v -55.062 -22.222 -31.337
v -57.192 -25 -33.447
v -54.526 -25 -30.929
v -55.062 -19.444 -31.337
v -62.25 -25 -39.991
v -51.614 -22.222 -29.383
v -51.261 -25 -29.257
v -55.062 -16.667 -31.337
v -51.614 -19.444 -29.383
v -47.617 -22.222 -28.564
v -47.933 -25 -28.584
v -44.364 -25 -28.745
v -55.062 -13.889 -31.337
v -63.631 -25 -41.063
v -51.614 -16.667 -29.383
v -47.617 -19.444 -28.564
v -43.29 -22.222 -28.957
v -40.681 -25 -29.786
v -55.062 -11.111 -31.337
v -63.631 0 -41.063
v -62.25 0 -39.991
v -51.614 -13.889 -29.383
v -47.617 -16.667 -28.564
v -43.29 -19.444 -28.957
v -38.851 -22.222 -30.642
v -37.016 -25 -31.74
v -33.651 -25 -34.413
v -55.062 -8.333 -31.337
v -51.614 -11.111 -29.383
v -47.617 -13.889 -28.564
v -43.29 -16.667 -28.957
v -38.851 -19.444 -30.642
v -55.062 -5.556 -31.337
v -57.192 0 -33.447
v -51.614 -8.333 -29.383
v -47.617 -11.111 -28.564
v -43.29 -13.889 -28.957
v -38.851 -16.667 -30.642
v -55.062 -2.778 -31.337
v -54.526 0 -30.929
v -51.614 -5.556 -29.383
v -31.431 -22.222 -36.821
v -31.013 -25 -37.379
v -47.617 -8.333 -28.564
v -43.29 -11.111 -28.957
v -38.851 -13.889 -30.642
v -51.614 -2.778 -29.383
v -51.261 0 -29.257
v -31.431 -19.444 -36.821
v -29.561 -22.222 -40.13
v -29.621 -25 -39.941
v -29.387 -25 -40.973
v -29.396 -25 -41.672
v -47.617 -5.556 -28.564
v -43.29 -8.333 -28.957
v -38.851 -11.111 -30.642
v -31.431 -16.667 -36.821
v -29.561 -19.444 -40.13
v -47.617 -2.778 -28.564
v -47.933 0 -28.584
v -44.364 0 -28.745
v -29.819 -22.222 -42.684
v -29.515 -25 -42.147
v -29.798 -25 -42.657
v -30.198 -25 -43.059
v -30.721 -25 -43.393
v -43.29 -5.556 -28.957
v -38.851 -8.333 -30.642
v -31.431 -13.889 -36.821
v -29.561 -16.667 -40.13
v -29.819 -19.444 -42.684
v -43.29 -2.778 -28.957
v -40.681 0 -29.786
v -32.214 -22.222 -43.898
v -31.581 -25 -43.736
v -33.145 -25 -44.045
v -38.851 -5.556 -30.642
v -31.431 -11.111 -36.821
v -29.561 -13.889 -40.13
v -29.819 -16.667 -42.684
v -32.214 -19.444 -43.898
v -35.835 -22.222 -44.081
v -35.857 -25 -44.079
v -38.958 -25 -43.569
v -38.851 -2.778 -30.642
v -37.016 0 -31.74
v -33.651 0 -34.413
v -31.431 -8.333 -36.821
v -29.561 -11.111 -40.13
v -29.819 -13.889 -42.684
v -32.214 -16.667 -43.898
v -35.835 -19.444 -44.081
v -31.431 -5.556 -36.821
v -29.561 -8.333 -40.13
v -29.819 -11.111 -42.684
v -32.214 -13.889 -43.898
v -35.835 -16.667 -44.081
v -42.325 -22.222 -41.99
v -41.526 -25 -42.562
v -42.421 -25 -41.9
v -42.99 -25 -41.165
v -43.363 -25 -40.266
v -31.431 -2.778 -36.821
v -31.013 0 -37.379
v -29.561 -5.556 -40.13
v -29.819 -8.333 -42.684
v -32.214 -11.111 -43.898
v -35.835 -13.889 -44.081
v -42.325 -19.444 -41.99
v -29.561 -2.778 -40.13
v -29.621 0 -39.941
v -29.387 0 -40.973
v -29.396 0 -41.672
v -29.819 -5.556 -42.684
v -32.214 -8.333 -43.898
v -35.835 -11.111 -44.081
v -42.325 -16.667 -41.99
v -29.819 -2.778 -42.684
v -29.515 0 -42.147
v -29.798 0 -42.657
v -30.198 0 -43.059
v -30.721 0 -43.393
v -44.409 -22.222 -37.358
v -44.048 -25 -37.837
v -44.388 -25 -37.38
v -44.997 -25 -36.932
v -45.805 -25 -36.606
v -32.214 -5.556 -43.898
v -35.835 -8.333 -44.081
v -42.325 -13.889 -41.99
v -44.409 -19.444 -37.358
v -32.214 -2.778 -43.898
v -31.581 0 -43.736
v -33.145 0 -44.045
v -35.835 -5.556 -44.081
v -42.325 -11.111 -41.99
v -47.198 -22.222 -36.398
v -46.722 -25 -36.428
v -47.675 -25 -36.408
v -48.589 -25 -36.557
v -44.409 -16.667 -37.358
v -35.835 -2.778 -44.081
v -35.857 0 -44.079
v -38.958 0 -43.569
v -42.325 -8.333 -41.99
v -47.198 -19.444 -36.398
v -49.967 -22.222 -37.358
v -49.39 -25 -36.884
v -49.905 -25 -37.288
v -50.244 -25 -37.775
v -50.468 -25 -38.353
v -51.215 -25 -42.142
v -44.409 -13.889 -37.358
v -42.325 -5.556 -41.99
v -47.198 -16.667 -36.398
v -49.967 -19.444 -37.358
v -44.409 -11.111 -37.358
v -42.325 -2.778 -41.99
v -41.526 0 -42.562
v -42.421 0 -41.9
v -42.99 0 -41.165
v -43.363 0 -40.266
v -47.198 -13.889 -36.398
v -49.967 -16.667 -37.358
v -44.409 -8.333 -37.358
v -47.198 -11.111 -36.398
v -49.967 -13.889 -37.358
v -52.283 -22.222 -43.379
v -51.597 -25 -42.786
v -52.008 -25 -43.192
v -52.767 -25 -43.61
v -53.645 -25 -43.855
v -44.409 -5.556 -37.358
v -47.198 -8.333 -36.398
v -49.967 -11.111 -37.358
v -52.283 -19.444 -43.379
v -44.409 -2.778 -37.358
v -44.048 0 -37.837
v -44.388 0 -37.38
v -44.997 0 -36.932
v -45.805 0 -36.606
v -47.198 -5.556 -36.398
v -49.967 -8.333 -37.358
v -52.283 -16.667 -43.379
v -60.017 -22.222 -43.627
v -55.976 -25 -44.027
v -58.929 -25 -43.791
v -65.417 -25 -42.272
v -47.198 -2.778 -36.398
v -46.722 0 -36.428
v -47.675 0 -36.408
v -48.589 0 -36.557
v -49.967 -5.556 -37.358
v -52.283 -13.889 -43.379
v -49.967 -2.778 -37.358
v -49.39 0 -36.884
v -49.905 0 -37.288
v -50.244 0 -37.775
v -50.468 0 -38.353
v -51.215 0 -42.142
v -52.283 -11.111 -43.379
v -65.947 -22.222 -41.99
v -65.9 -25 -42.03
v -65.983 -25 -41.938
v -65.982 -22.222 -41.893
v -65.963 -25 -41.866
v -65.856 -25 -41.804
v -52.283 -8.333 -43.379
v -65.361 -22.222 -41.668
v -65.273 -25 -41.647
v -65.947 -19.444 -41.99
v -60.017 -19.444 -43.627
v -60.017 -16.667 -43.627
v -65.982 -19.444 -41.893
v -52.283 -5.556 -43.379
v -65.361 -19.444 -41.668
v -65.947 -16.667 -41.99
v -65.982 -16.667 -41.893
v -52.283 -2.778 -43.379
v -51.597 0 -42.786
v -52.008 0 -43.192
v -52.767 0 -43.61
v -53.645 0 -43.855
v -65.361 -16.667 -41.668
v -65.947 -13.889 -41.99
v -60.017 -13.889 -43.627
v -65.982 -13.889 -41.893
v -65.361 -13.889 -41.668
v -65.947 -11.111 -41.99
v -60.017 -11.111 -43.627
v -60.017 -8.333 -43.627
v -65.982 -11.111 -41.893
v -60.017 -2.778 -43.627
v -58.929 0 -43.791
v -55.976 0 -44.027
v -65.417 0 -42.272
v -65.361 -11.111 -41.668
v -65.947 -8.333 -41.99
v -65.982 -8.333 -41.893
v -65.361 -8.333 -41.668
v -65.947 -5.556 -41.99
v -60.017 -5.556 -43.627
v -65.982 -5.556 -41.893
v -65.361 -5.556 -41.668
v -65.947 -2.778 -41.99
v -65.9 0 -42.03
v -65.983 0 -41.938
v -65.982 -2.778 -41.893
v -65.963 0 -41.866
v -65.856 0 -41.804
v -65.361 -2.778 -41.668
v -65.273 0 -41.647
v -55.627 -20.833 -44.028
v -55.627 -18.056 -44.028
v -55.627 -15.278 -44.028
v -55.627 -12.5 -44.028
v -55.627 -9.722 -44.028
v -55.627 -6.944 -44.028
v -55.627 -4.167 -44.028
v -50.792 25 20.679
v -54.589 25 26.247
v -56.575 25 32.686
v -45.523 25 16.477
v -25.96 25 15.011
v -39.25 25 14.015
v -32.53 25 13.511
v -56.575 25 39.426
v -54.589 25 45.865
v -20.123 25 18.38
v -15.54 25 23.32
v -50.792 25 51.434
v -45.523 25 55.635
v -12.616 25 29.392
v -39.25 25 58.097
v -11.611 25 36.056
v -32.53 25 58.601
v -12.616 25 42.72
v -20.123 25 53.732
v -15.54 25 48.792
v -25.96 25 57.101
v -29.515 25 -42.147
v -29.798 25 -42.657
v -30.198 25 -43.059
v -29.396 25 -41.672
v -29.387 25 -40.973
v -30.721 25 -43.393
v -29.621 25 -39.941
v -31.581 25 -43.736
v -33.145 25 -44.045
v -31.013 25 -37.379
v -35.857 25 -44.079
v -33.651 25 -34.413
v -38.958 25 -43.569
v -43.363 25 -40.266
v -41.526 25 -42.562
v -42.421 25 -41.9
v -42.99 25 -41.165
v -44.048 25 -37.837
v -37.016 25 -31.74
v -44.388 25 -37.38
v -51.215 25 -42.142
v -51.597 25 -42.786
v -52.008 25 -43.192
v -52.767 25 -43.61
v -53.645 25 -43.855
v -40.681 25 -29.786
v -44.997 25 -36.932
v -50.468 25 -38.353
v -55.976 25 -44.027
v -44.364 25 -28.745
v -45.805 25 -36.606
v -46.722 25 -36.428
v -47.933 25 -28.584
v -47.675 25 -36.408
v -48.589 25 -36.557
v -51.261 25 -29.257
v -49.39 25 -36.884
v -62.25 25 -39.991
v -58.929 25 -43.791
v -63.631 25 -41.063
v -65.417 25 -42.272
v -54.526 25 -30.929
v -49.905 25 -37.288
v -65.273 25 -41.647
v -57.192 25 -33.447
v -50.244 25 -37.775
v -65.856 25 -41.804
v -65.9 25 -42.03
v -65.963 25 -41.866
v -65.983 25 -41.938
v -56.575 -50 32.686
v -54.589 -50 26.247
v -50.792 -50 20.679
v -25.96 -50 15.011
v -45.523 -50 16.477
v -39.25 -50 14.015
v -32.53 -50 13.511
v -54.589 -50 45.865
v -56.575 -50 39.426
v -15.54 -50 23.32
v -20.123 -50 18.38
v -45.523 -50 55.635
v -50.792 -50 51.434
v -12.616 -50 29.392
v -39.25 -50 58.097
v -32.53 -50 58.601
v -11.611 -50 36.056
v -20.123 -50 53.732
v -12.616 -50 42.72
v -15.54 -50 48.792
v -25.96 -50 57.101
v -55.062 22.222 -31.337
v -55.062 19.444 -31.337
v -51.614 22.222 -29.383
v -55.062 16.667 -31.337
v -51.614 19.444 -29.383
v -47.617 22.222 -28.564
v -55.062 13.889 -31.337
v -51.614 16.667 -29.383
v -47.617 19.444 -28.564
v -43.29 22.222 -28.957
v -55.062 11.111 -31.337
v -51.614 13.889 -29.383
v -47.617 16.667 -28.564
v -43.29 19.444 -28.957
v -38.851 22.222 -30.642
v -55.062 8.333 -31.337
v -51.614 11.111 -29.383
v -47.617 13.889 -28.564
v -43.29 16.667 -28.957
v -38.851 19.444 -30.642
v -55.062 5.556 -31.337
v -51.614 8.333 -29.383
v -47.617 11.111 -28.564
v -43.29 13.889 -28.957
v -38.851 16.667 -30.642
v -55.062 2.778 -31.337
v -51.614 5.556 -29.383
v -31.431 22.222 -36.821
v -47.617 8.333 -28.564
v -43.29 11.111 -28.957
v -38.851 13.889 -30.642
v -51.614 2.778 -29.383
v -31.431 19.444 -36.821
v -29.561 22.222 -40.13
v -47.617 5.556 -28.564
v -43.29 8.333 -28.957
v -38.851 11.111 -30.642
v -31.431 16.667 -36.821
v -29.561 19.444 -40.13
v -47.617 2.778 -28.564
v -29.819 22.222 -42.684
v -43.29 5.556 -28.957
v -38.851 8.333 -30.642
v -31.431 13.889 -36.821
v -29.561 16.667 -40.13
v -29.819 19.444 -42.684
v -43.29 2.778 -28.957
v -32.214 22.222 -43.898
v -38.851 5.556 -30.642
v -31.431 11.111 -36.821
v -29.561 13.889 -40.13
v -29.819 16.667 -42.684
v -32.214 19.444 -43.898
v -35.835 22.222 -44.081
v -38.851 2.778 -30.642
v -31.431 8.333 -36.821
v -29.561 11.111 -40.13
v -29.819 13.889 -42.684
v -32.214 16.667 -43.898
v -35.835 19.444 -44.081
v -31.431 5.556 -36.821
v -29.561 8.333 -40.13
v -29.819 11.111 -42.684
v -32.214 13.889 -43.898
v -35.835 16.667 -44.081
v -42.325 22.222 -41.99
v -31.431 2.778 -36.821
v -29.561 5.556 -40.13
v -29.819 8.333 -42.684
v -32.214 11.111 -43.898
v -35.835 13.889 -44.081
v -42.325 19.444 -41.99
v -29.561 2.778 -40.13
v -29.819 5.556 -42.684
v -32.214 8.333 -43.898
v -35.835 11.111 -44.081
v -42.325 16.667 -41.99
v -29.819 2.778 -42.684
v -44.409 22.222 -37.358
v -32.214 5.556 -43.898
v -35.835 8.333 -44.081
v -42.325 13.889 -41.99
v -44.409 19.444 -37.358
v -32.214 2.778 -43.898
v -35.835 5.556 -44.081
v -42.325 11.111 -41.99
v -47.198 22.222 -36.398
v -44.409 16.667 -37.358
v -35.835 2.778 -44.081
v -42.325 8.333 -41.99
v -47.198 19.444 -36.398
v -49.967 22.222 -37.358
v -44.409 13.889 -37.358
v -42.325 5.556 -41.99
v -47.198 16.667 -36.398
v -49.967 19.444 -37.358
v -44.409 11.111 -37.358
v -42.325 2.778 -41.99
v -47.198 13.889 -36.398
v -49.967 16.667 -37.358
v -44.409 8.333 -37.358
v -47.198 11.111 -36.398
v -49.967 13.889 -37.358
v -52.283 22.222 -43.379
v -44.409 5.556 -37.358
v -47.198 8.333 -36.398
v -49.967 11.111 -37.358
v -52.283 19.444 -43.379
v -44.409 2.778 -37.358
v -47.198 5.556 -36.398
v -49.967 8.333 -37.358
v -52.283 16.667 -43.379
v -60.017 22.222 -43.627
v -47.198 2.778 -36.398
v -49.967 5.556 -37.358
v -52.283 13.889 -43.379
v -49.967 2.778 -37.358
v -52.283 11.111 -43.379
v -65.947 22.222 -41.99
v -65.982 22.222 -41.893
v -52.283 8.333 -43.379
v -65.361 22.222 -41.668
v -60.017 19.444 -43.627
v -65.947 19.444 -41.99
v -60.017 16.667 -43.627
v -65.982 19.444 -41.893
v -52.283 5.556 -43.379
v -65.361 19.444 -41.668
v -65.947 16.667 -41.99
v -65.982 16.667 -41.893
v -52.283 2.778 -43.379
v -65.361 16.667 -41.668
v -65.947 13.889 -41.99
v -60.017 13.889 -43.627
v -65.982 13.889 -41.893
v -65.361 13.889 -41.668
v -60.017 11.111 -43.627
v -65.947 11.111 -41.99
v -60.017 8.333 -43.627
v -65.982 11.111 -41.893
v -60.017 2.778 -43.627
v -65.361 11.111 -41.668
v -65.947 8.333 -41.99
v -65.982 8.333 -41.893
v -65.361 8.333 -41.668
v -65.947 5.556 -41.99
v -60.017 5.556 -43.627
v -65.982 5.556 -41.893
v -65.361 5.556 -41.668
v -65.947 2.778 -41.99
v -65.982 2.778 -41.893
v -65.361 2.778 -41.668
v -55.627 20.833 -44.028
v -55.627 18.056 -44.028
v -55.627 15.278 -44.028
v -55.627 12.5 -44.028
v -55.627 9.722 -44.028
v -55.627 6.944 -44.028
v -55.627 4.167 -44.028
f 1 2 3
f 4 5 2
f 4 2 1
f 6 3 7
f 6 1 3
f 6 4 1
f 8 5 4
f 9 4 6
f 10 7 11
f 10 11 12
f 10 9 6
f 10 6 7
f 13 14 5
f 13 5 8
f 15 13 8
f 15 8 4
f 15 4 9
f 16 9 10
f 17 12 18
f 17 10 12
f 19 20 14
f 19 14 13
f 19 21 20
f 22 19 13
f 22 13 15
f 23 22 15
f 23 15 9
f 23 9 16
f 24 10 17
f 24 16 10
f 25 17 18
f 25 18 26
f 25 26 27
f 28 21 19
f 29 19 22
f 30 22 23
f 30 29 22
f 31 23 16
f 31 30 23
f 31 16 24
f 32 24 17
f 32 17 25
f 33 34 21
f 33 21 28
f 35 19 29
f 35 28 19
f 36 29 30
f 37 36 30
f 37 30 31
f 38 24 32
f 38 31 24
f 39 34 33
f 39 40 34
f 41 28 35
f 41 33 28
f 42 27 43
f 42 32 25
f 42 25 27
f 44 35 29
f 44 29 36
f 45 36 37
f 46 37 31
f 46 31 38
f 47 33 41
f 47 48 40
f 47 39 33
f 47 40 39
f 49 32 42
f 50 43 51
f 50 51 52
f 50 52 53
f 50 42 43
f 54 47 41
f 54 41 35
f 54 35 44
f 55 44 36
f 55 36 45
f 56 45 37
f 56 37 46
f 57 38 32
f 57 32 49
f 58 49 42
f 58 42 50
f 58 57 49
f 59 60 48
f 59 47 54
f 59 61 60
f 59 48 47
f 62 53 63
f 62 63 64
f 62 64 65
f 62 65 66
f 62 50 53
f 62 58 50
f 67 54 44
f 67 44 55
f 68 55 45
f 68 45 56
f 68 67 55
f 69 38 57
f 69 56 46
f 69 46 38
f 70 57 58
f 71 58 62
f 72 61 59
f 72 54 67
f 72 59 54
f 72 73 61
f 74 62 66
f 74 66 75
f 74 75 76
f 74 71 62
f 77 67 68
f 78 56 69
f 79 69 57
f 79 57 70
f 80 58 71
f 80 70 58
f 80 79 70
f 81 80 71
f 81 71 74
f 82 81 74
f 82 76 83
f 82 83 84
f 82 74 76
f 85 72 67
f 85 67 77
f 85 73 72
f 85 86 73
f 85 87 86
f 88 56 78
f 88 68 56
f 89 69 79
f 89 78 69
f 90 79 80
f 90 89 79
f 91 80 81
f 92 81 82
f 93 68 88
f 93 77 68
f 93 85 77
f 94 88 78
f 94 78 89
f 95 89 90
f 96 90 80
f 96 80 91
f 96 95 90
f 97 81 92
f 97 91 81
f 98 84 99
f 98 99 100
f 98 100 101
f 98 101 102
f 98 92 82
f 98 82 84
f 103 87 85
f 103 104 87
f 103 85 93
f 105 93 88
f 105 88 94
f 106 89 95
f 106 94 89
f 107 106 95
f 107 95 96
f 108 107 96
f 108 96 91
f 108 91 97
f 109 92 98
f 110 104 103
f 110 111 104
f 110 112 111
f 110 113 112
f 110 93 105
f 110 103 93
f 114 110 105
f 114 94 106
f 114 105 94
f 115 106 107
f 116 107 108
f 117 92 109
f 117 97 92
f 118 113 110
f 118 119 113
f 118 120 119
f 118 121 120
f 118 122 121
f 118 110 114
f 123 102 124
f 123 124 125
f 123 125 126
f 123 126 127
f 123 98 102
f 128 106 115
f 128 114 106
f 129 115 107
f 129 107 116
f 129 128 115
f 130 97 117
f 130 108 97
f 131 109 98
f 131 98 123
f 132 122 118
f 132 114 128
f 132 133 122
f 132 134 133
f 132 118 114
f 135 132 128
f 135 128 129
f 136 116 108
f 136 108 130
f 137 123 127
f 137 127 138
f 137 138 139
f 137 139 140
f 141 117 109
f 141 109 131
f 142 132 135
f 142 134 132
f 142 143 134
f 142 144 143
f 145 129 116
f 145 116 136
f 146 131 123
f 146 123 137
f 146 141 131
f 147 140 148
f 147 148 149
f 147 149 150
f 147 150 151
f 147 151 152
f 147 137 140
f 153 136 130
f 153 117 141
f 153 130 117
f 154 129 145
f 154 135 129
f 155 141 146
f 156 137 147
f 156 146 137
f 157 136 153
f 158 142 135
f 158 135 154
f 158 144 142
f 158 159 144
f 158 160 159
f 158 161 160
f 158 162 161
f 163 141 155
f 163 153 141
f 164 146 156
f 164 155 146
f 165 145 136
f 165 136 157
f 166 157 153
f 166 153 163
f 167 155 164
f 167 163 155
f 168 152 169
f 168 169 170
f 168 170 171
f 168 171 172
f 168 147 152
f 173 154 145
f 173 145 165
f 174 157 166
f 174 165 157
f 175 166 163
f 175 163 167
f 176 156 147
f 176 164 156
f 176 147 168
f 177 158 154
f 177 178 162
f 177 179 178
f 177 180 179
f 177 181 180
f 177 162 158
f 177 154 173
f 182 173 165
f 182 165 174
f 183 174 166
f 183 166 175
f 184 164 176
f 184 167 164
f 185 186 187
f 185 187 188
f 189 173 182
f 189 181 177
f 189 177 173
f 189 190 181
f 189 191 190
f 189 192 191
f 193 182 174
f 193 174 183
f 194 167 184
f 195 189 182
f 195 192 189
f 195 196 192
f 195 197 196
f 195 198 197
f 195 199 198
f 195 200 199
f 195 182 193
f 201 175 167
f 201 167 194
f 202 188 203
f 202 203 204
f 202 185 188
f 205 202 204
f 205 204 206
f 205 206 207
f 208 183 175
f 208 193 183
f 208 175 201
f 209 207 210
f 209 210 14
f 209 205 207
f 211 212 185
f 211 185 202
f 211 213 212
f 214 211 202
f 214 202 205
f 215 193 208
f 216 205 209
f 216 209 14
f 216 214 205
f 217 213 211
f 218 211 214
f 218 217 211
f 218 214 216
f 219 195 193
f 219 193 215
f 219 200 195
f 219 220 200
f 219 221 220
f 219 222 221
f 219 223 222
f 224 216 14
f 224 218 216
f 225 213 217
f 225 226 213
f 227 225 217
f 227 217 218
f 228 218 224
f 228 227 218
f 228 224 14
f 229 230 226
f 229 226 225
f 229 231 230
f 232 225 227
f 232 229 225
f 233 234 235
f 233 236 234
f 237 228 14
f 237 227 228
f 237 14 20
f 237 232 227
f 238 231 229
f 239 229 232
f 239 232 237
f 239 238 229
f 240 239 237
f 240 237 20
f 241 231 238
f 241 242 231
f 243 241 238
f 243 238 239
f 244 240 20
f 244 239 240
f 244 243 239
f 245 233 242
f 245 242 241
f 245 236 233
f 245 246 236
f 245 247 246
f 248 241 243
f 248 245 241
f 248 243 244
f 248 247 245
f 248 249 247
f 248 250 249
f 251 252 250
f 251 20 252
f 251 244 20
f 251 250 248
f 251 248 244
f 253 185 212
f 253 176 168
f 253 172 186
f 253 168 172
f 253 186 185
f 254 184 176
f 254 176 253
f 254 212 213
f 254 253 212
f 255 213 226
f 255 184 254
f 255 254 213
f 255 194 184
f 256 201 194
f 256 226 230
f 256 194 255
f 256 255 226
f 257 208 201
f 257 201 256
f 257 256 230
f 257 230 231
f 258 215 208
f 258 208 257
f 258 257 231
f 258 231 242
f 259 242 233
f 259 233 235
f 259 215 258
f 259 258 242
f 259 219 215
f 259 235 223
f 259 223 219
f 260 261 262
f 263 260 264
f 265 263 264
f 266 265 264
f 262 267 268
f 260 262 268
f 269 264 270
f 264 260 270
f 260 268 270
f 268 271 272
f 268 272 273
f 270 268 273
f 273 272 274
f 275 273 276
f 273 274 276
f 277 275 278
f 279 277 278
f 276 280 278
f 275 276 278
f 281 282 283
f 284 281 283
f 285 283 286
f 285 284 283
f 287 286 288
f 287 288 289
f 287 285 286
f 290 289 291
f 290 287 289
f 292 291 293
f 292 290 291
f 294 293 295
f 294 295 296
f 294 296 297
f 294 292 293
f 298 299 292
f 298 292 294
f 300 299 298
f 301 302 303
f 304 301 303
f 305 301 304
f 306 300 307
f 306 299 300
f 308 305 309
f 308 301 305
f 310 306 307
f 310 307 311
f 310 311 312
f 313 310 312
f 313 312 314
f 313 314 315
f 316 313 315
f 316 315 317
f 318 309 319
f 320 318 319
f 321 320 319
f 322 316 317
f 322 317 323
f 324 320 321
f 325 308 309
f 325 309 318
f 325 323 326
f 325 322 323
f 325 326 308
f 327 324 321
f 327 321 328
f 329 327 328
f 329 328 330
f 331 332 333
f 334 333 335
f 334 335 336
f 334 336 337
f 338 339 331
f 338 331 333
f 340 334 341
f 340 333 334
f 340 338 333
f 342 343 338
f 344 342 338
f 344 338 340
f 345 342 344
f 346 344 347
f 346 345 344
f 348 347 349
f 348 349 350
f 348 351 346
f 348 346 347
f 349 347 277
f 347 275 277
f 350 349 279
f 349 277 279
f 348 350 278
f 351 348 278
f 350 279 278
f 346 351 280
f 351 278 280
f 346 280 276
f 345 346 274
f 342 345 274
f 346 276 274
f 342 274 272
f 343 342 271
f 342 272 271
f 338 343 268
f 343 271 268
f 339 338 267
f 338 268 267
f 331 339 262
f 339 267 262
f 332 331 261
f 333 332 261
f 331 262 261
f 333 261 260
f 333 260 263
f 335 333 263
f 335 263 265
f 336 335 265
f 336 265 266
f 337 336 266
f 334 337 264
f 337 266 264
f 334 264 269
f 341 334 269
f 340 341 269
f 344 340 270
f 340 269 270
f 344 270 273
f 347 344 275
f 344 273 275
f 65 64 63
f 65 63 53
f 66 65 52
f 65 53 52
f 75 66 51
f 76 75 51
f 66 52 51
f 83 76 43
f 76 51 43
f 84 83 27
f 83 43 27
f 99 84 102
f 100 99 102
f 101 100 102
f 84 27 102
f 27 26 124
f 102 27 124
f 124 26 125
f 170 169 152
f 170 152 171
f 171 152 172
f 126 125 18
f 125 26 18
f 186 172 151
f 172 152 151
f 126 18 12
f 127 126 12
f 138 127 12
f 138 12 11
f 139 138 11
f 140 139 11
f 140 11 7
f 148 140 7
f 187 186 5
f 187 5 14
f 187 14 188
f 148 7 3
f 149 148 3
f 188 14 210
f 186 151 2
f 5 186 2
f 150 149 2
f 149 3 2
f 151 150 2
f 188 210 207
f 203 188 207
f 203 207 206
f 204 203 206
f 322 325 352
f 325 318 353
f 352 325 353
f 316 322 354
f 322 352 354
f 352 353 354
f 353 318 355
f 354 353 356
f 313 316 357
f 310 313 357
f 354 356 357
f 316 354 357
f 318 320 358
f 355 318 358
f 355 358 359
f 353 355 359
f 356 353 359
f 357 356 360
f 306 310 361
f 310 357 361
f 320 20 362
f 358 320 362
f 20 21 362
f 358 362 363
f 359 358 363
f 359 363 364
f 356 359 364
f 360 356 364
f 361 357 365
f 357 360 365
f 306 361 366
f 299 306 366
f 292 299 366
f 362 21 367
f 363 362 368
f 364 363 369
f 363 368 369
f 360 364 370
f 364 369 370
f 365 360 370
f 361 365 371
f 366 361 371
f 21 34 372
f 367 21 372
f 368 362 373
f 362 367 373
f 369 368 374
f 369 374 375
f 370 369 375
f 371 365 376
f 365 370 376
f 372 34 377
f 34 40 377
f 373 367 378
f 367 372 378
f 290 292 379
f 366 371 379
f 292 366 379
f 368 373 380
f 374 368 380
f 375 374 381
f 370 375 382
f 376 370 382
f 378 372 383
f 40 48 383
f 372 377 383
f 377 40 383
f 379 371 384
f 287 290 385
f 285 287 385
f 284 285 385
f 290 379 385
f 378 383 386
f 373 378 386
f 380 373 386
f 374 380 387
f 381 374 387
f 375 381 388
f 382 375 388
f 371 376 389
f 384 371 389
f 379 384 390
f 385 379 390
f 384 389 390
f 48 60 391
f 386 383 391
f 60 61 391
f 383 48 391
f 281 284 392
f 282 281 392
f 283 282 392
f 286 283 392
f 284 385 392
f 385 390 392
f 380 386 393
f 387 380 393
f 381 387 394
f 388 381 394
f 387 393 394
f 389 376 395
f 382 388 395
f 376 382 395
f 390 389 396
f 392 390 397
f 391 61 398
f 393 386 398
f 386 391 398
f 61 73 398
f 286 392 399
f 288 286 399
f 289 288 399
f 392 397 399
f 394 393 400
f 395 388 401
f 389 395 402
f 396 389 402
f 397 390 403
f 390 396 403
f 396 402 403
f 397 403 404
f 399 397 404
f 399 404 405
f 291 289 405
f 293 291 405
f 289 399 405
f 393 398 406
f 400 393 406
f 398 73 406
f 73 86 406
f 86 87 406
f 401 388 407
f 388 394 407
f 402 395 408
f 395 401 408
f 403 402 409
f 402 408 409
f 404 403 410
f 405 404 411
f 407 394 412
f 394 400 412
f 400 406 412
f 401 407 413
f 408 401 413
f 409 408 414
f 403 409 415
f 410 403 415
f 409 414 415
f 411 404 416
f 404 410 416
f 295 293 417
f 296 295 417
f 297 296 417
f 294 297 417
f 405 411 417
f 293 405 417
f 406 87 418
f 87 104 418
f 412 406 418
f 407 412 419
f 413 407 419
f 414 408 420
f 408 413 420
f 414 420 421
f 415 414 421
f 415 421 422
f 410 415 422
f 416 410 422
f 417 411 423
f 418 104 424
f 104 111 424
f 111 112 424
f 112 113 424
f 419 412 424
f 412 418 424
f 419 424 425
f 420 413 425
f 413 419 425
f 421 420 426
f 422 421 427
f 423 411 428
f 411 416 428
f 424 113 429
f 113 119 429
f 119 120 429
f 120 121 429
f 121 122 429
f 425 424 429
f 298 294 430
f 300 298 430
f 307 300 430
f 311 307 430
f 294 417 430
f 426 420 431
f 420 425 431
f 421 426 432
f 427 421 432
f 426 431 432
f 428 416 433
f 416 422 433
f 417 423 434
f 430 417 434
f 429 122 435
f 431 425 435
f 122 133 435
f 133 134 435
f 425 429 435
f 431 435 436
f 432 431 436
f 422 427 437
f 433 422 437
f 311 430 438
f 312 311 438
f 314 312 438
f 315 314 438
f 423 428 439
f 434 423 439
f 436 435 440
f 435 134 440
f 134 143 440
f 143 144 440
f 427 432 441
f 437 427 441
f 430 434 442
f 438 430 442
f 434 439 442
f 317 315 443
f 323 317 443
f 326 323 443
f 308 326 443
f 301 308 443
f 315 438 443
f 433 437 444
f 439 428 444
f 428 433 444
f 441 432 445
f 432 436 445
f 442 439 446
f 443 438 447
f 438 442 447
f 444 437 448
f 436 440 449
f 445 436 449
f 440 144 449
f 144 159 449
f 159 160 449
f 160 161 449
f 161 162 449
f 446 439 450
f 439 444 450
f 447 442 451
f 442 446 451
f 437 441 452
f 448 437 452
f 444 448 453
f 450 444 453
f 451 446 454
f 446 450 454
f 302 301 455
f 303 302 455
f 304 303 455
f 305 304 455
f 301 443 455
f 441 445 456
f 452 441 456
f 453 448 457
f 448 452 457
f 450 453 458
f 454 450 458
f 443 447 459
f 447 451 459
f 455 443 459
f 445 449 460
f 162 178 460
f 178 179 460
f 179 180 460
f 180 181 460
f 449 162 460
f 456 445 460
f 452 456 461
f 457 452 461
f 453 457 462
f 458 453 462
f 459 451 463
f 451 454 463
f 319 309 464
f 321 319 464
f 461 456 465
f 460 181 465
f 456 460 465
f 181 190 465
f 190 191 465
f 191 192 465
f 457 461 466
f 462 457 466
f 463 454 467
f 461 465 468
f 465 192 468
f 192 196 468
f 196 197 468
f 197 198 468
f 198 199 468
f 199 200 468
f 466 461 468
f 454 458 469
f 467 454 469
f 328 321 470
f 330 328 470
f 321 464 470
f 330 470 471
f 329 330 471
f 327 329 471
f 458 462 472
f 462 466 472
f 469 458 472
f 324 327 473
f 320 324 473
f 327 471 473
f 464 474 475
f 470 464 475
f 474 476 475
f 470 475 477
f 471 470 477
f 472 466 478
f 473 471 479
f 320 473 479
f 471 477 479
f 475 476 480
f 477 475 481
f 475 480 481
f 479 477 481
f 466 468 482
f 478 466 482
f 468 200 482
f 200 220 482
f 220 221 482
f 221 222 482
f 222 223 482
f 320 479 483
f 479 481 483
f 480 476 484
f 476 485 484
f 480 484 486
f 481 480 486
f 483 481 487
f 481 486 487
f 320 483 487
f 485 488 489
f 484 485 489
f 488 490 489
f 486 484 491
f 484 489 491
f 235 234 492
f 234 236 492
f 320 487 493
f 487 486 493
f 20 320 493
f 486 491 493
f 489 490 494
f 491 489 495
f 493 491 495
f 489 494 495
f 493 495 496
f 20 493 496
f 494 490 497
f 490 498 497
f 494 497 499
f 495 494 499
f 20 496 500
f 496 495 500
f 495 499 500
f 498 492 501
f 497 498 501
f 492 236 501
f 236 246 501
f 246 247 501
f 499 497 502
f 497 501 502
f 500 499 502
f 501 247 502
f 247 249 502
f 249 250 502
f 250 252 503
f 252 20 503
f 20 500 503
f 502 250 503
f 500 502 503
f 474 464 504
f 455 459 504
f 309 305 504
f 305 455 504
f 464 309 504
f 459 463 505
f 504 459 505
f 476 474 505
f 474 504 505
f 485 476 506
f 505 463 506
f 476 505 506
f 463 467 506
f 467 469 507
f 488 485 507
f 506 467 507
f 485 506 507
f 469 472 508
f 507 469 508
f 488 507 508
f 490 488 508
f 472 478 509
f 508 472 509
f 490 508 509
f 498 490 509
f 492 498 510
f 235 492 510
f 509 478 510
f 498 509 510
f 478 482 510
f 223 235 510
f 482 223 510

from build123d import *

# Parameters (mm, degrees)
F0_R          = 22.6081890005
F1_DEPTH      = 25
F1_DEPTH_BACK = 25
F2_DEPTH      = 25
F2_DEPTH_BACK = 10
F4_DEPTH      = 25
F4_DEPTH_BACK = 25


with BuildPart() as f1:
    # F0 (on Front) → F1 (new body, two sides)
    with BuildSketch(Plane.XZ) as f1_sk:
        with Locations((-34.2193432152, 36.0560752451)):
            Circle(F0_R)
    extrude(amount=F1_DEPTH)
    extrude(f1_sk.sketch, amount=-F1_DEPTH_BACK)

    # F2 (add, two sides): a face of the model
    f2_faces = [f1.faces().sort_by_distance(p)[0] for p in [
        (-34.2193432152, -25, 36.0560752451),
    ]]
    extrude(f2_faces, amount=F2_DEPTH)
    extrude(f2_faces, amount=-F2_DEPTH_BACK)


with BuildPart() as f4:
    # F3 (on Front) → F4 (new body, two sides)
    with BuildSketch(Plane.XZ) as f4_sk:
        with BuildLine():
            add(Edge.make_bspline(
                [(-63.6312365532, -41.0633087158), (-60.8211270214, -39.5326244587), (-56.4506492919, -28.4660144835), (-38.7955010897, -27.0091462454), (-22.8141098296, -45.9308536763), (-44.9717923163, -43.7581340376), (-42.5658968287, -36.3495222877), (-52.2240357952, -35.7827783866), (-48.6038056513, -46.9320244746), (-69.47039064, -41.6041276228), (-64.8639100139, -41.7347536681), (-63.6312365532, -41.0633087158)],
                knots=[0, 0, 0, 0, 0.1309993209, 0.2775632856, 0.4187311014, 0.5474998449, 0.6295001226, 0.7152798238, 0.8076952305, 0.9425362661, 1, 1, 1, 1], degree=3))
        make_face()
    extrude(amount=F4_DEPTH)
    extrude(f4_sk.sketch, amount=-F4_DEPTH_BACK)


solid = Compound([f1.part, f4.part])
